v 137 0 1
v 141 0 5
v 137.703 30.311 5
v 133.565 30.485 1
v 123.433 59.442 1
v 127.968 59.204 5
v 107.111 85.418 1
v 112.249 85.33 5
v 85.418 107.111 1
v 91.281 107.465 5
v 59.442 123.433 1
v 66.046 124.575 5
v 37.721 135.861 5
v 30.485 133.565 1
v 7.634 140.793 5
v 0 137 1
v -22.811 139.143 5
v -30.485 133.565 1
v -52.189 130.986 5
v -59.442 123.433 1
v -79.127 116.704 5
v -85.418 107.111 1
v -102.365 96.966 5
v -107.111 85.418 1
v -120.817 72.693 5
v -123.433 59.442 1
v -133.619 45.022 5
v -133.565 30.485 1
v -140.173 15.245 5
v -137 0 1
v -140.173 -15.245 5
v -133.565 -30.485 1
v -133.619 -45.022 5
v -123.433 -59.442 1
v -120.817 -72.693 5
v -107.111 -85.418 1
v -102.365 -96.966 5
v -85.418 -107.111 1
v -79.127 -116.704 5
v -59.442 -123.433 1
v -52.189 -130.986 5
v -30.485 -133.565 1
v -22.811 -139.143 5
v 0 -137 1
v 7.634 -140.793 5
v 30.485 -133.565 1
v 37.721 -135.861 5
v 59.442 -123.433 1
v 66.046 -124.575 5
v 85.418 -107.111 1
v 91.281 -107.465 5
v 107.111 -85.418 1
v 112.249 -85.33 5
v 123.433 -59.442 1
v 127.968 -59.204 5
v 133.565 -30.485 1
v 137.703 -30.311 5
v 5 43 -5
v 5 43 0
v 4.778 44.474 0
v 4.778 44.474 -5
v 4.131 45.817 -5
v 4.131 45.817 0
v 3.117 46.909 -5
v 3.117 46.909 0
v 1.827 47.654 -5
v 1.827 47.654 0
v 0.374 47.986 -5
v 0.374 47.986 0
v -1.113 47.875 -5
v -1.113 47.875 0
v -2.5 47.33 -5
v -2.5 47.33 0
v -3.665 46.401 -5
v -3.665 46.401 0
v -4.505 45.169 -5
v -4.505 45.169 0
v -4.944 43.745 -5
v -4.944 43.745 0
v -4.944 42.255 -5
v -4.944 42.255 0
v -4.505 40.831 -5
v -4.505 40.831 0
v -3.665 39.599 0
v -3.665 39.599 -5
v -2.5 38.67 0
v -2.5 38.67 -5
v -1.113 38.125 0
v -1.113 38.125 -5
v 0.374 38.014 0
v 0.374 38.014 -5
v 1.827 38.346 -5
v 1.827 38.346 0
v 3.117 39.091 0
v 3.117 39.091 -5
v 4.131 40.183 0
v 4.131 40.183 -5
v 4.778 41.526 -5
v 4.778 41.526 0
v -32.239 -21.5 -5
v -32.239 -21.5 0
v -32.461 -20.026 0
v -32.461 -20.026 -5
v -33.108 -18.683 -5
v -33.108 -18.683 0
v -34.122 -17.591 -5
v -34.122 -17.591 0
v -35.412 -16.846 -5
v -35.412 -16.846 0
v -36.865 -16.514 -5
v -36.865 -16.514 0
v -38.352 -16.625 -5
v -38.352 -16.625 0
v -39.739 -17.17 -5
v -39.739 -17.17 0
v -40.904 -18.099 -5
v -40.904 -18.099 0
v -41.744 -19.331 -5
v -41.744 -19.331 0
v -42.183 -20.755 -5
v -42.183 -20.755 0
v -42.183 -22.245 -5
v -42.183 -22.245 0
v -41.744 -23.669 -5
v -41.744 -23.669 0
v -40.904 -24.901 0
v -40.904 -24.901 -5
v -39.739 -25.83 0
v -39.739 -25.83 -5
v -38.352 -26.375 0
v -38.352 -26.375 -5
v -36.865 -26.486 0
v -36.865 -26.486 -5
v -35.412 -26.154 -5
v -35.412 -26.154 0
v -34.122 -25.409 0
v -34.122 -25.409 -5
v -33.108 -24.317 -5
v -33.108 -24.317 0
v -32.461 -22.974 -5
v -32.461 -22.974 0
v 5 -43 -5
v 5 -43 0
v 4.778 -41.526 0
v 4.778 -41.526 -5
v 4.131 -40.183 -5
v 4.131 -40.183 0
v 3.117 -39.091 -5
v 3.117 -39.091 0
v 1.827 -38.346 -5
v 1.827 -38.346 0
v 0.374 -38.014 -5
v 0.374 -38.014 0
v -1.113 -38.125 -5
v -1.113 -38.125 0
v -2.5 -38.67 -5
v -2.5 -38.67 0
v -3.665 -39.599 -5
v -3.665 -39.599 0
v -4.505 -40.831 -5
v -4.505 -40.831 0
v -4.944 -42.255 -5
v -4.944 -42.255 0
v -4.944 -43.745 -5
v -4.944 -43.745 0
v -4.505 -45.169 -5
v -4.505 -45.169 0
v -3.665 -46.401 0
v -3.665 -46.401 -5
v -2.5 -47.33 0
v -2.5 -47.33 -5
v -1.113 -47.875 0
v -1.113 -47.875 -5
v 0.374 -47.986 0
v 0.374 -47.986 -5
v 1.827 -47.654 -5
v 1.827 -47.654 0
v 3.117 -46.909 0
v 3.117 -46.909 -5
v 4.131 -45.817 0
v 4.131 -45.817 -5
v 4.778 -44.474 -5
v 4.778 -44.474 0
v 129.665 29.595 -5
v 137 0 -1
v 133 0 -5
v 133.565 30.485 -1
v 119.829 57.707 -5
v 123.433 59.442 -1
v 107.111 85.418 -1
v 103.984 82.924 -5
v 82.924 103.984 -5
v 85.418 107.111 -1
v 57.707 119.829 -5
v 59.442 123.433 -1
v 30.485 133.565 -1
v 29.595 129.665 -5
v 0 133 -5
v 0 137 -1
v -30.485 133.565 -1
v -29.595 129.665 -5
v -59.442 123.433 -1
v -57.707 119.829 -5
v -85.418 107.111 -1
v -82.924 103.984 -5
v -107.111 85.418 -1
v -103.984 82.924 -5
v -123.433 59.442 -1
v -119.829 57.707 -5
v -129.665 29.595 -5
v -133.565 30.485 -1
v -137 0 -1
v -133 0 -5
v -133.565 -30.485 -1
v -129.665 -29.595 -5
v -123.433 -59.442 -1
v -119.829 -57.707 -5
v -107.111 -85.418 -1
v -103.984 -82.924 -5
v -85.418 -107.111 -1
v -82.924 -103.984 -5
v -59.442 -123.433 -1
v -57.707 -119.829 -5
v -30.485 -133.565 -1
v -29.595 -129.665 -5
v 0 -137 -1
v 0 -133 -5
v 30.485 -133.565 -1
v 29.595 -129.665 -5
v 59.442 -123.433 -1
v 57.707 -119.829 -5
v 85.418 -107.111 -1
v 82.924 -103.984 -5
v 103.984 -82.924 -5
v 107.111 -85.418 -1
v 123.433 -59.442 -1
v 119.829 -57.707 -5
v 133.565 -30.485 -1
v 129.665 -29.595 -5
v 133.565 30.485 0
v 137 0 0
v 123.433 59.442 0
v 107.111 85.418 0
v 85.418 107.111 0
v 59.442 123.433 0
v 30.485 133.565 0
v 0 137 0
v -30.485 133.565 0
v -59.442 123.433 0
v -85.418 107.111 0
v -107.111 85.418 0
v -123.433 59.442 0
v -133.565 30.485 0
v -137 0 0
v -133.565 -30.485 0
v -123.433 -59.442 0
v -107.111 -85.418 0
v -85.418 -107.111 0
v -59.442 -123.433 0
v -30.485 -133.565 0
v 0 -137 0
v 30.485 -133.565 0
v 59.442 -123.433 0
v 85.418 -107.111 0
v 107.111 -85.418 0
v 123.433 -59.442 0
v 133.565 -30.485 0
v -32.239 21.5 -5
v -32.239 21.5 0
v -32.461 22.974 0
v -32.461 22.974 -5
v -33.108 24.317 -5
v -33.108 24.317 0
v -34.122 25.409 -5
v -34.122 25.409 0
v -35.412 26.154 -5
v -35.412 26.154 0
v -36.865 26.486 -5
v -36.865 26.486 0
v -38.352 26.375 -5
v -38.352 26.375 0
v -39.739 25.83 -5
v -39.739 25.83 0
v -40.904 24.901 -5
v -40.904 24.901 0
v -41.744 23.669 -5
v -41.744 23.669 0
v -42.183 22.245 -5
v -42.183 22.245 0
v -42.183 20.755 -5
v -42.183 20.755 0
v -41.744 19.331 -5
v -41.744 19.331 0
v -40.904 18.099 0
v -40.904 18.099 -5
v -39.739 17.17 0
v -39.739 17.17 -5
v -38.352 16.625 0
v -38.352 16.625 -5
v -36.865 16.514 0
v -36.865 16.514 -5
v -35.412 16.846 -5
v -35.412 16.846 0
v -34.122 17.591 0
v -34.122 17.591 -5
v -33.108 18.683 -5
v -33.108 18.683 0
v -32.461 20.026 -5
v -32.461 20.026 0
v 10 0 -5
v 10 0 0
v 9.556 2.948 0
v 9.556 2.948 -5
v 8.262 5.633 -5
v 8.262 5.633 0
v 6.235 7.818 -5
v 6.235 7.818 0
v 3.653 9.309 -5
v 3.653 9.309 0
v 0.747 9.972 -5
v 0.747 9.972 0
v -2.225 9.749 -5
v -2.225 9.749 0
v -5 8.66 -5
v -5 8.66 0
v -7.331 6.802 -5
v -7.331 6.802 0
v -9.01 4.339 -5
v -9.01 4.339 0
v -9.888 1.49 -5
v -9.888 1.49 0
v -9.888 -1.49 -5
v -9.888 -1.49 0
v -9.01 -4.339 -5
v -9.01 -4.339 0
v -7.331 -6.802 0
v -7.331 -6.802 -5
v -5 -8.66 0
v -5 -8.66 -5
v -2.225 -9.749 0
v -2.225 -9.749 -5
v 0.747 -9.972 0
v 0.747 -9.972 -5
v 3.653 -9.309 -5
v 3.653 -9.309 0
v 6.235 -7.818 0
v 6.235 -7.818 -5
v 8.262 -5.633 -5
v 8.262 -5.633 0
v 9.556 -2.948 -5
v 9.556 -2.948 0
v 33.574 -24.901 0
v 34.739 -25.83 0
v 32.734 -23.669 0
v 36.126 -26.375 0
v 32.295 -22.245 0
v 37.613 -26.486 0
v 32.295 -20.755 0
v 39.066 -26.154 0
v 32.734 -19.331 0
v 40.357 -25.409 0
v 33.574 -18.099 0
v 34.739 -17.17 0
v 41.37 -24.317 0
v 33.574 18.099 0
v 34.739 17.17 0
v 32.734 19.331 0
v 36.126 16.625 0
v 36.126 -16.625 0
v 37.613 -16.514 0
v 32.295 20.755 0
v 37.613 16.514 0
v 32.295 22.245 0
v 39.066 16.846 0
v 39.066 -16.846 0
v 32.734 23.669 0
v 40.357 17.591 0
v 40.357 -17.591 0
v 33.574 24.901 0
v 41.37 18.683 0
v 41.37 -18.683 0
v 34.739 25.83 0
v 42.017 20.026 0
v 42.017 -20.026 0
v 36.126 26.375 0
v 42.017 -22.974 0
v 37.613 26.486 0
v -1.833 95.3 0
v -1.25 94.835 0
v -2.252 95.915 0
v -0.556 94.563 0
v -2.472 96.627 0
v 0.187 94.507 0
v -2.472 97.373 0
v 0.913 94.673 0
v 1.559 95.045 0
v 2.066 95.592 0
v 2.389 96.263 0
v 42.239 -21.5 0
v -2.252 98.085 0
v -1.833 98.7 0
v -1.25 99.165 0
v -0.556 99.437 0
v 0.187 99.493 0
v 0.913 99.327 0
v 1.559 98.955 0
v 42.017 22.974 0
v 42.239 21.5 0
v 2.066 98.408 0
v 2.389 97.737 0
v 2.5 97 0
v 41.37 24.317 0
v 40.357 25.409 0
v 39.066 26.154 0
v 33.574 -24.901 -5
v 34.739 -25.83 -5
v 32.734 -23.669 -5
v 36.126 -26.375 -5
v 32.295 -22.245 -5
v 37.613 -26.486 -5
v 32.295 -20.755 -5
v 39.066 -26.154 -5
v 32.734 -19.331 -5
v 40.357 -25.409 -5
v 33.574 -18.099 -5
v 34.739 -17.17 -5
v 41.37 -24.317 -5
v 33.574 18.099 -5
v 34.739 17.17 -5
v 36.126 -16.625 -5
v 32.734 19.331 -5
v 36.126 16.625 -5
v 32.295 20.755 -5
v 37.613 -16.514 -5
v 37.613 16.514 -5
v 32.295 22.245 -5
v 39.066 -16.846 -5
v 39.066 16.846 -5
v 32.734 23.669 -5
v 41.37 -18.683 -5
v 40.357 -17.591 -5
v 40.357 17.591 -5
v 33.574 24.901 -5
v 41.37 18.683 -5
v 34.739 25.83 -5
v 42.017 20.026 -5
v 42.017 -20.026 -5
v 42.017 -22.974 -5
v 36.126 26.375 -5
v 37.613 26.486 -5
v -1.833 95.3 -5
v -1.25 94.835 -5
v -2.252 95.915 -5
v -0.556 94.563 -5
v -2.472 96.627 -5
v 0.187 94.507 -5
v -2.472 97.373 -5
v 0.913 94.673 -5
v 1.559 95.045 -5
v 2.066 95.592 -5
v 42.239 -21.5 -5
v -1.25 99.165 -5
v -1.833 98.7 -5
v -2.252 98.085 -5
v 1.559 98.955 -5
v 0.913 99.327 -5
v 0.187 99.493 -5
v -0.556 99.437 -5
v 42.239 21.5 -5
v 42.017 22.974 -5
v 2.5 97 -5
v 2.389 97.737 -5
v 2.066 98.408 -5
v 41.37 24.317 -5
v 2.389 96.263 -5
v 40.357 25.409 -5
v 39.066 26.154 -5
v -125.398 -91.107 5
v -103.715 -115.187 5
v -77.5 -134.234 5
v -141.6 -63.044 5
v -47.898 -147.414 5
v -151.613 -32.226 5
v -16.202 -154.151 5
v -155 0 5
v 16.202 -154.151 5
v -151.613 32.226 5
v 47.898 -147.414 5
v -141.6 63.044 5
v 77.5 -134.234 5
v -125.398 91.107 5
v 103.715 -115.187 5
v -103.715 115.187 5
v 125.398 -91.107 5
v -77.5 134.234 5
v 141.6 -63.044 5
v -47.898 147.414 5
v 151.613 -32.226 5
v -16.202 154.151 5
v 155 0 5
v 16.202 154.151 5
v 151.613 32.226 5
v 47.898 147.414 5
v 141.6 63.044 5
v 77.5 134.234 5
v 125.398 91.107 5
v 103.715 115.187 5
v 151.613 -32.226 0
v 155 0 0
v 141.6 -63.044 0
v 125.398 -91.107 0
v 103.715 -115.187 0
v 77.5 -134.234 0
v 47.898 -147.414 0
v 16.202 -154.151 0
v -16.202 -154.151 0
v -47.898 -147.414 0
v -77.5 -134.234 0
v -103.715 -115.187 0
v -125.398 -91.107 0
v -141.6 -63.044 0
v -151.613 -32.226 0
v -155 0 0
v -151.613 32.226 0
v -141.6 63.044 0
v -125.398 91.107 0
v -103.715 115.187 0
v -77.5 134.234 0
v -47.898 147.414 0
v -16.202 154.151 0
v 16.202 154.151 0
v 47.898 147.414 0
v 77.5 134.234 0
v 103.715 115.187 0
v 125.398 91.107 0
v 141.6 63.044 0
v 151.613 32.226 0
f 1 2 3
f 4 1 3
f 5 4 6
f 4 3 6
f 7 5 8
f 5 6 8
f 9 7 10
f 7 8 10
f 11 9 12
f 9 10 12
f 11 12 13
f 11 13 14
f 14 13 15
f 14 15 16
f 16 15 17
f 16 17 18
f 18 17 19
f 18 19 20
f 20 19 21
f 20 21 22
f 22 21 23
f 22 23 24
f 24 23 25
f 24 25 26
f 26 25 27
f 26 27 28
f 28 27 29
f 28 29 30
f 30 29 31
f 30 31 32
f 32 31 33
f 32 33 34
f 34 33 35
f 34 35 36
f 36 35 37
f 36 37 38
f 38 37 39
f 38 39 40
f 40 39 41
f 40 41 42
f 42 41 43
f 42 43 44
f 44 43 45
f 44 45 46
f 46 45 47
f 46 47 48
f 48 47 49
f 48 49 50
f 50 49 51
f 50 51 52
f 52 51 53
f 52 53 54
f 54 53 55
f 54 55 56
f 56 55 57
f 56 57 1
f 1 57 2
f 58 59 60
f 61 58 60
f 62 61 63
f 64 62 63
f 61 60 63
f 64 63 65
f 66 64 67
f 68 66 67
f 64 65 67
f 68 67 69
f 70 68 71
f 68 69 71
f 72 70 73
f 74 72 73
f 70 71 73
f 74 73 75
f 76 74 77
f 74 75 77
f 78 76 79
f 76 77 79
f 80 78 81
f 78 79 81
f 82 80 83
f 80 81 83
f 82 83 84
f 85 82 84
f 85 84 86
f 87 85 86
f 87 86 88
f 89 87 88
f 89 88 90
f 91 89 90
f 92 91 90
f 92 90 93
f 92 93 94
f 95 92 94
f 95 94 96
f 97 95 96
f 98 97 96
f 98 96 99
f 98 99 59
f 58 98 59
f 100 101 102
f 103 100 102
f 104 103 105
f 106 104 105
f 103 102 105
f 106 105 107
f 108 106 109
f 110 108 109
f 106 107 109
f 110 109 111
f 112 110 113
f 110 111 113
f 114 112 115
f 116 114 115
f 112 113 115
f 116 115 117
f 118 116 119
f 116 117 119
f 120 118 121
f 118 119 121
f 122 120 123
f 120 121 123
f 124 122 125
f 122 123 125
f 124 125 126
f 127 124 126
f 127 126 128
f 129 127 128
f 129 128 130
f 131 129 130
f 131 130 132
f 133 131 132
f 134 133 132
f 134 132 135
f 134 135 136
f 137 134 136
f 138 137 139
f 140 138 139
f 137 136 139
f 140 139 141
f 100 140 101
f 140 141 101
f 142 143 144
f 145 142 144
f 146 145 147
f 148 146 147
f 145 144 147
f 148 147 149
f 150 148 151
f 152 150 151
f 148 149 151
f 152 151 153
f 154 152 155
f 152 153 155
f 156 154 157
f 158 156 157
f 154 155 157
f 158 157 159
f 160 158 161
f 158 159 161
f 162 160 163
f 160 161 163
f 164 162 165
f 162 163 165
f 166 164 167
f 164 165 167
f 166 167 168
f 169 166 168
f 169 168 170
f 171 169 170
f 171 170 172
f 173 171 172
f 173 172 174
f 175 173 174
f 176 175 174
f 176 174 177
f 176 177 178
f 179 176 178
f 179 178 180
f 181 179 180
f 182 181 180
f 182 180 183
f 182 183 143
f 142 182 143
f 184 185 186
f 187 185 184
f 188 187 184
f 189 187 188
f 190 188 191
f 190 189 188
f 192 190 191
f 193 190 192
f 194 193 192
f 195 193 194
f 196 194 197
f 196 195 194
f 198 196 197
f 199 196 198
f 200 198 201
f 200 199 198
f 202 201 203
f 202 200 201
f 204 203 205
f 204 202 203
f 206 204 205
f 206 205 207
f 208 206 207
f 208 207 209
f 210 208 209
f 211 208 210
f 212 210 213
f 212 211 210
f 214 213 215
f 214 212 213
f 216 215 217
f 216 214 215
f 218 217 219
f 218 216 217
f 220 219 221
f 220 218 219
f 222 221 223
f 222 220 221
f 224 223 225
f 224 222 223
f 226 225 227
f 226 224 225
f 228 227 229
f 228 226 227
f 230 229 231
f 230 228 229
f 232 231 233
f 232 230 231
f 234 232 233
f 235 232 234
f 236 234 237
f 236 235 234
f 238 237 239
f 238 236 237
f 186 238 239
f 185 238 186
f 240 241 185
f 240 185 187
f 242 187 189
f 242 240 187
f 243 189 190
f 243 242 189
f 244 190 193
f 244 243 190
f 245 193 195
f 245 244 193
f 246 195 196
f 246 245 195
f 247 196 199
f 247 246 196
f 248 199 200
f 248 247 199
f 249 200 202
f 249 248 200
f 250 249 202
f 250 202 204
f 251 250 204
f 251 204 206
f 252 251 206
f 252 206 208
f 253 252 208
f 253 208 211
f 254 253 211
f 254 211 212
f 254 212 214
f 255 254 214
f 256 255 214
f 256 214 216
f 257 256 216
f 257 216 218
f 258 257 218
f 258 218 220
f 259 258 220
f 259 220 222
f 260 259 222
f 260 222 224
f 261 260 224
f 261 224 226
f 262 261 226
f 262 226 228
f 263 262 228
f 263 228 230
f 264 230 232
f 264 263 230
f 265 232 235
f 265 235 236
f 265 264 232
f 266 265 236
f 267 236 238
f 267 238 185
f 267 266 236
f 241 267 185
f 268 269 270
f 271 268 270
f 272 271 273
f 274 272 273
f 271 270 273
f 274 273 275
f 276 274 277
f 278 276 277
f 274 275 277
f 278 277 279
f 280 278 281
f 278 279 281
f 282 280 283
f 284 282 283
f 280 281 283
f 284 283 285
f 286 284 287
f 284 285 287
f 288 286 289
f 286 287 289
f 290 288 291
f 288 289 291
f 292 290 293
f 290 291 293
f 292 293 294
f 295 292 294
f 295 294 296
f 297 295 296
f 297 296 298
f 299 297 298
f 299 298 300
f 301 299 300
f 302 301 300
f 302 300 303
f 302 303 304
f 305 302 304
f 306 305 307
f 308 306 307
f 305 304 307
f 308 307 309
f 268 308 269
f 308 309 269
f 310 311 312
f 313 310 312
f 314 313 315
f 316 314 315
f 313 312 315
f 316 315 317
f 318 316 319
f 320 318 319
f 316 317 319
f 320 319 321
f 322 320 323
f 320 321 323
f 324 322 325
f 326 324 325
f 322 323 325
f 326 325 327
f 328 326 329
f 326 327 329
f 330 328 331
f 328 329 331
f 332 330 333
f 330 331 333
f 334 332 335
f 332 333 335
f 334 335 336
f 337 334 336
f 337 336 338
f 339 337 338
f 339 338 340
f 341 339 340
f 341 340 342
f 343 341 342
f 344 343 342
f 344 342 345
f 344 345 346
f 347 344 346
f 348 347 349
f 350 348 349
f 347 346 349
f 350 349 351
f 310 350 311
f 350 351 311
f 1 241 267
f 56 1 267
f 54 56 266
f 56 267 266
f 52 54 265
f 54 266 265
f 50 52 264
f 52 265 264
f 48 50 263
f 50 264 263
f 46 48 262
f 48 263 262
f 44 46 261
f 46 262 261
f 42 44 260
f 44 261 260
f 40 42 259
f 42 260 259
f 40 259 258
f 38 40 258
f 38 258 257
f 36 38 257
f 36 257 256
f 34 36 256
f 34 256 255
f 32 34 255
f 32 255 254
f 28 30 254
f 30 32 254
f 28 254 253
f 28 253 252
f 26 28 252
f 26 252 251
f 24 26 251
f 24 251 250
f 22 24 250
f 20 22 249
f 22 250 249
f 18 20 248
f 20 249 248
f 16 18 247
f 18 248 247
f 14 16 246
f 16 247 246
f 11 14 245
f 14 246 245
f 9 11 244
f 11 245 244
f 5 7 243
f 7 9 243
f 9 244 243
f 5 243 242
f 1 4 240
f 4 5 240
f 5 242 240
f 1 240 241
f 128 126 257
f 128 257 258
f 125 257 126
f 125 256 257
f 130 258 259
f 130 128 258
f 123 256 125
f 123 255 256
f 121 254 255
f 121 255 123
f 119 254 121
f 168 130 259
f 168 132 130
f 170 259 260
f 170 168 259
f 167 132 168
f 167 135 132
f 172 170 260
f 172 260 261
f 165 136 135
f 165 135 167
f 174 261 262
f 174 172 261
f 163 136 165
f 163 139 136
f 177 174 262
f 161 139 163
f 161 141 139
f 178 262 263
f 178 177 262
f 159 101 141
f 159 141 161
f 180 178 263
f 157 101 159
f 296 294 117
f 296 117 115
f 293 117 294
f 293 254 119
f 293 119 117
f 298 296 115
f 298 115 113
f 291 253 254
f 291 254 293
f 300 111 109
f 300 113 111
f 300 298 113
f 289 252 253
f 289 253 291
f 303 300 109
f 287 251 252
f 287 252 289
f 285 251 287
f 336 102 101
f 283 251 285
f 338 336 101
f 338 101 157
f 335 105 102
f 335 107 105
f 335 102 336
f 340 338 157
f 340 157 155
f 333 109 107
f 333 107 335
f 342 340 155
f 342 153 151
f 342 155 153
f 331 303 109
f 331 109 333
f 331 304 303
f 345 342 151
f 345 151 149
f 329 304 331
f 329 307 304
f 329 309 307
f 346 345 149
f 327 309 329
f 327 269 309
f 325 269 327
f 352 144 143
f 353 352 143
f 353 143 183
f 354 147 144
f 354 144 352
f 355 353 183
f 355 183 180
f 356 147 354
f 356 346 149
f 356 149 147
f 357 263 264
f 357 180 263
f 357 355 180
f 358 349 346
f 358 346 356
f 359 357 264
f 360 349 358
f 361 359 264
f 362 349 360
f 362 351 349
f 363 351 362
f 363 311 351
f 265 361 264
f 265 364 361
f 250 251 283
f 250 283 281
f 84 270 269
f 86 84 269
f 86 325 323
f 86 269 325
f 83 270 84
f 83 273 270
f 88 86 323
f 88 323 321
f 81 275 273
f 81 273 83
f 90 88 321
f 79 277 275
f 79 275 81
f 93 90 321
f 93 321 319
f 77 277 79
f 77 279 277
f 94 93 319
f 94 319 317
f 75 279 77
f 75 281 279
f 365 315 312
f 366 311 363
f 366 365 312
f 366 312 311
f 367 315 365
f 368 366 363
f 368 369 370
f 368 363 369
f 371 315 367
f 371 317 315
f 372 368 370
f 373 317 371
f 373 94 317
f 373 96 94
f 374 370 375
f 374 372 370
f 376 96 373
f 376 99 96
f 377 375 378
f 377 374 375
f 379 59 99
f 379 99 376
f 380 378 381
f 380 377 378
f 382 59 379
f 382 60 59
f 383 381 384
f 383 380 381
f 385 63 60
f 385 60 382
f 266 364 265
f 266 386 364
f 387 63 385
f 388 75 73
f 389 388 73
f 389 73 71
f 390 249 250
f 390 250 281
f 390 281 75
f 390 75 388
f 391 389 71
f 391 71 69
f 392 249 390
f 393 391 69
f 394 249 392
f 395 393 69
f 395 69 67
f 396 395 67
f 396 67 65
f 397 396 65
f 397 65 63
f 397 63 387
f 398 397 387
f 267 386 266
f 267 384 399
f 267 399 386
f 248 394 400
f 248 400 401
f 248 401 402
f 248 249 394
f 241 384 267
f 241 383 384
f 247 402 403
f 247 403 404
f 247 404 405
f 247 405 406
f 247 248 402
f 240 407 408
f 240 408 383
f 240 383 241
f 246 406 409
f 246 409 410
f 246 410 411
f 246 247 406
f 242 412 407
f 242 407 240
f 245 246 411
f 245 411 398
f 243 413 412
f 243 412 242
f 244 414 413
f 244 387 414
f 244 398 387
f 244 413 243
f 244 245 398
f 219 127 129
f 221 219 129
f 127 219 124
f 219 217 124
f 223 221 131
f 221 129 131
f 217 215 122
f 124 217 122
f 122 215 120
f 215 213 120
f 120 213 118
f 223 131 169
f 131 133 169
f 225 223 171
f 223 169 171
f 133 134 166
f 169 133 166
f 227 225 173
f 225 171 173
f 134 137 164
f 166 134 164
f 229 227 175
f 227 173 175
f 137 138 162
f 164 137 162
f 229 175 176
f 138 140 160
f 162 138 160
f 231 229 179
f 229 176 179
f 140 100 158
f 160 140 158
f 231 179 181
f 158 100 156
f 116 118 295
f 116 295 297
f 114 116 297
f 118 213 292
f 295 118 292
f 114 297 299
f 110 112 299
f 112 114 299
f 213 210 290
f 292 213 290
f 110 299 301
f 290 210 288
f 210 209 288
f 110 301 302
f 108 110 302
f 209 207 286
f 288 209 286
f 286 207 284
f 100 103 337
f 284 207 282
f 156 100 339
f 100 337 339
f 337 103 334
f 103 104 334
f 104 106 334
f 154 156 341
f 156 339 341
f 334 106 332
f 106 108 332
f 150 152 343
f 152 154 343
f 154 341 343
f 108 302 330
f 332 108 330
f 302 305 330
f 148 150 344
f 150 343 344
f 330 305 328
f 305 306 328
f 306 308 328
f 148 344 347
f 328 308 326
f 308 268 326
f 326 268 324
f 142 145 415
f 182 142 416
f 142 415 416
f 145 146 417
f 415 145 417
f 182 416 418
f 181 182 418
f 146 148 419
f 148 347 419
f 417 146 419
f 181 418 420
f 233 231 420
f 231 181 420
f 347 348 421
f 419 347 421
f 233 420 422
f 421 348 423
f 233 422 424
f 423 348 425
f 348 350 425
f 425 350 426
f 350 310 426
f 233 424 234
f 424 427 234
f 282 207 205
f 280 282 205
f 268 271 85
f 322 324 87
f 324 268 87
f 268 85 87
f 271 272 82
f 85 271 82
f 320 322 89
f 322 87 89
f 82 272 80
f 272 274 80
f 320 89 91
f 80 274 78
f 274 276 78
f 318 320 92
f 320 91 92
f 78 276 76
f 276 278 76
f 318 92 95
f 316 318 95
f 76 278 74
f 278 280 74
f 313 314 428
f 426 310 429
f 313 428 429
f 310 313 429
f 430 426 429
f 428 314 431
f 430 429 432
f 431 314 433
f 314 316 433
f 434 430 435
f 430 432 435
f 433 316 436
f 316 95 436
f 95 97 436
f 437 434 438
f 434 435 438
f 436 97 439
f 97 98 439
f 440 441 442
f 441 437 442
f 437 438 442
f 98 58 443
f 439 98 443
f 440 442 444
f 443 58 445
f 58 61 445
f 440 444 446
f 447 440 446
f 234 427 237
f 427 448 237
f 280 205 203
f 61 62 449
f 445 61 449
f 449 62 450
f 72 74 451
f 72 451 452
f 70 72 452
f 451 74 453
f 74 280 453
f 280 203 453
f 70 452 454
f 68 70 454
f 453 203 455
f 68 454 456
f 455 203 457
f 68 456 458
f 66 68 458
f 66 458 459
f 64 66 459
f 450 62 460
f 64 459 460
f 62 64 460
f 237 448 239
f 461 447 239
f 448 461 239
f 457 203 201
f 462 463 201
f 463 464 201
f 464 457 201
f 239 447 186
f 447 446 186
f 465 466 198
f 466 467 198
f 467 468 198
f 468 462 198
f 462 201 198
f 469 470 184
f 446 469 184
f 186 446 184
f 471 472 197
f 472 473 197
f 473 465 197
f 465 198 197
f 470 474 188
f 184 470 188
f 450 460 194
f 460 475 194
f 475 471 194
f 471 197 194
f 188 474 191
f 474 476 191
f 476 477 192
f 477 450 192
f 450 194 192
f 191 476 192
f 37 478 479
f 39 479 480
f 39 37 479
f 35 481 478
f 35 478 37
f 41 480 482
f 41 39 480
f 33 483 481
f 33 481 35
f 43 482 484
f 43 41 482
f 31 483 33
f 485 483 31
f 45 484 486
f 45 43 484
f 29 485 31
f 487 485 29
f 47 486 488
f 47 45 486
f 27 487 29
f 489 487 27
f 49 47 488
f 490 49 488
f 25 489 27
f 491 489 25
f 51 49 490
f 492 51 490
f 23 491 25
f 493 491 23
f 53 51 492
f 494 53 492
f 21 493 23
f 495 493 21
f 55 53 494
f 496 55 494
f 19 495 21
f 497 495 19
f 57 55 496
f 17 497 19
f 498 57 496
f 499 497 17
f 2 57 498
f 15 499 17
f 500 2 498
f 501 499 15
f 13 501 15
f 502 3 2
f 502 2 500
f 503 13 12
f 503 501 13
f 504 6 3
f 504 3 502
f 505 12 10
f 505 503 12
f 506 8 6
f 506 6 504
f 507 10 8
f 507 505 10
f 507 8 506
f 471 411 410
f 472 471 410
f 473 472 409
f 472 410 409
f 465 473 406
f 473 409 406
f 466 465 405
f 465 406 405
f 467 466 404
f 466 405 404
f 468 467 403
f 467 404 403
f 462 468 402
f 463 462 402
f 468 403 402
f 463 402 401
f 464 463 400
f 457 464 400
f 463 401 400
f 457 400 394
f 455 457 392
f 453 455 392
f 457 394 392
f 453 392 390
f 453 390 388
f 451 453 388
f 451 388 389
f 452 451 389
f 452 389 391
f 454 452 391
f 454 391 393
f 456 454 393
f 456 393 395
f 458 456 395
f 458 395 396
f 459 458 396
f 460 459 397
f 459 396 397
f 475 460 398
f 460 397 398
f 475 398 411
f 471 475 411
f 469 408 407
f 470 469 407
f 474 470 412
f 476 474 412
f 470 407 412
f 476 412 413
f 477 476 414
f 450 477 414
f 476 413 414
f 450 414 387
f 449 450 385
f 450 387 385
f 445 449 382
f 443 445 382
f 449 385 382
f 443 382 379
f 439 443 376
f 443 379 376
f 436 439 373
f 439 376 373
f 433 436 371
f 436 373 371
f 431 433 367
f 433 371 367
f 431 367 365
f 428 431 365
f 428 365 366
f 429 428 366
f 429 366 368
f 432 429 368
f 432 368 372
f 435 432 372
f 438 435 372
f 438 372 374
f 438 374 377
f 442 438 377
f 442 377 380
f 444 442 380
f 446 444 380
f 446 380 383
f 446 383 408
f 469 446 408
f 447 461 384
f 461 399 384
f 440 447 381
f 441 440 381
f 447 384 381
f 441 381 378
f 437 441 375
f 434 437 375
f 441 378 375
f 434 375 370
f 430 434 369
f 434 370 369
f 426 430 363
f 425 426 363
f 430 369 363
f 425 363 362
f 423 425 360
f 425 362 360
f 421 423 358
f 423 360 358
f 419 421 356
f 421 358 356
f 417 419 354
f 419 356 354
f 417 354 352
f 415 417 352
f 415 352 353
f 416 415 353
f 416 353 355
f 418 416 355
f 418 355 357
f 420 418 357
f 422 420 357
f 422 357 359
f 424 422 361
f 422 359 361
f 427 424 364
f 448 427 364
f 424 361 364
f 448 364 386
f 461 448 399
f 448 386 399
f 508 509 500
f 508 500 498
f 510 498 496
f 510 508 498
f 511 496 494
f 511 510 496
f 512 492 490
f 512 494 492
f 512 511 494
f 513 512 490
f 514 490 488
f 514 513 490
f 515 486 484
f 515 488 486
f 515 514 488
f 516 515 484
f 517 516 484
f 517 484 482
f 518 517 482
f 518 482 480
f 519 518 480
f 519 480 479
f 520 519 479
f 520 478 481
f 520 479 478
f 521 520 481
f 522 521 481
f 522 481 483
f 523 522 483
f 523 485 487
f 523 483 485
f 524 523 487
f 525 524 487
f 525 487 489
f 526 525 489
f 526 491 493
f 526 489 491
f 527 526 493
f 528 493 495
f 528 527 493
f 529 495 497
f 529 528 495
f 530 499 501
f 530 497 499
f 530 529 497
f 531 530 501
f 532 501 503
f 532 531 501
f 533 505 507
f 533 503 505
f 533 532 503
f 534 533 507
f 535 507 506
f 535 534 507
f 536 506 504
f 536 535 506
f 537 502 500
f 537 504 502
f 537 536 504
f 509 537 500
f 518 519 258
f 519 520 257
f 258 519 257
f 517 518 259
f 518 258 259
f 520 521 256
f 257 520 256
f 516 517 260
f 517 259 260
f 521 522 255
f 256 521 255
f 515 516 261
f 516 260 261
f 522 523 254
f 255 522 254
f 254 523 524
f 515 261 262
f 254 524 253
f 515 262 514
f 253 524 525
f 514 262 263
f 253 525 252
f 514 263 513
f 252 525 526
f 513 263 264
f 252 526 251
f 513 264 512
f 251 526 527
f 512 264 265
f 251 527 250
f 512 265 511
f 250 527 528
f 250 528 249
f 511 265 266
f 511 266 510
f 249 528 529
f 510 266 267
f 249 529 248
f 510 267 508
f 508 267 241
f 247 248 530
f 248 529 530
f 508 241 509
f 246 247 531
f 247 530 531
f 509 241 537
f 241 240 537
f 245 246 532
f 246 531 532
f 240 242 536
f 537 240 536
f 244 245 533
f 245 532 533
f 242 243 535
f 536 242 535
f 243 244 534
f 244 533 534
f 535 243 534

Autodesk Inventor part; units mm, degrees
ref_plane "YZ Plane" through (0, 0, 0) normal (1, 0, 0) x (0, 1, 0)
ref_plane "XZ Plane" through (0, 0, 0) normal (0, 1, 0) x (-1, 0, 0)
sketch "Sketch1" plane through (0, 0, 0) normal (0, 0, 1) x (1, 0, 0)
  circle A0 centre (0, 0) radius 155
  circle A1 centre (0, 0) radius 10
  circle A2 centre (0, 0) radius 137
  dimension "d0" = 310
  dimension "d1" = 20
  dimension "d2" = 274
extrude "Extrusion1" add sketch "Sketch1" along normal blind 5 contours A0
extrude "Extrusion2" add sketch "Sketch1" against normal blind 5 contours A2
sketch "Sketch2" plane through (0, 0, 0) normal (0, 0, 1) x (1, 0, 0)
  circle A0 centre (0, 43) radius 5
  circle A1 centre (-37.2391, 21.5) radius 5
  circle A2 centre (-37.2391, -21.5) radius 5
  circle A3 centre (0, -43) radius 5
  circle A4 centre (37.2391, -21.5) radius 5
  circle A5 centre (37.2391, 21.5) radius 5
  point P0 (0, 0)
  point P1 (0, 0)
  point P2 (0, 0)
  point P3 (0, 0)
  point P4 (0, 0)
  point P5 (0, 0)
  point P6 (0, 0)
  point P7 (0, 0)
  point P8 (0, 0)
  point P9 (0, 0)
  point P10 (0, 0)
  point P11 (0, 0)
  dimension "d10" = 10
  dimension "d11" = 43
  dimension "d9" = 360
extrude "Extrusion3" cut sketch "Sketch2" against normal blind 5
chamfer "Chamfer1" distance 4 angle 45 1 edges at (-137, 0, 5)
chamfer "Chamfer2" distance 4 angle 45 1 edges at (-137, 0, -5)
ref_plane "Work Plane1" through (0, 0, 0) normal (0, 0, 1) x (1, 0, 0)
sketch "Sketch3" plane through (0, 0, 0) normal (0, 0, 1) x (1, 0, 0)
  circle A0 centre (0, 97) radius 2.5
  line L0 (0, 97) -> (0, 137)
  circle A1 centre (0, 0) radius 137 projected
  dimension "d23" = 5
  dimension "d26" = 40
extrude "Extrusion4" cut sketch "Sketch3" against normal blind 5 contours A0
properties part number "FrontDisk" material "Steel, Alloy"
